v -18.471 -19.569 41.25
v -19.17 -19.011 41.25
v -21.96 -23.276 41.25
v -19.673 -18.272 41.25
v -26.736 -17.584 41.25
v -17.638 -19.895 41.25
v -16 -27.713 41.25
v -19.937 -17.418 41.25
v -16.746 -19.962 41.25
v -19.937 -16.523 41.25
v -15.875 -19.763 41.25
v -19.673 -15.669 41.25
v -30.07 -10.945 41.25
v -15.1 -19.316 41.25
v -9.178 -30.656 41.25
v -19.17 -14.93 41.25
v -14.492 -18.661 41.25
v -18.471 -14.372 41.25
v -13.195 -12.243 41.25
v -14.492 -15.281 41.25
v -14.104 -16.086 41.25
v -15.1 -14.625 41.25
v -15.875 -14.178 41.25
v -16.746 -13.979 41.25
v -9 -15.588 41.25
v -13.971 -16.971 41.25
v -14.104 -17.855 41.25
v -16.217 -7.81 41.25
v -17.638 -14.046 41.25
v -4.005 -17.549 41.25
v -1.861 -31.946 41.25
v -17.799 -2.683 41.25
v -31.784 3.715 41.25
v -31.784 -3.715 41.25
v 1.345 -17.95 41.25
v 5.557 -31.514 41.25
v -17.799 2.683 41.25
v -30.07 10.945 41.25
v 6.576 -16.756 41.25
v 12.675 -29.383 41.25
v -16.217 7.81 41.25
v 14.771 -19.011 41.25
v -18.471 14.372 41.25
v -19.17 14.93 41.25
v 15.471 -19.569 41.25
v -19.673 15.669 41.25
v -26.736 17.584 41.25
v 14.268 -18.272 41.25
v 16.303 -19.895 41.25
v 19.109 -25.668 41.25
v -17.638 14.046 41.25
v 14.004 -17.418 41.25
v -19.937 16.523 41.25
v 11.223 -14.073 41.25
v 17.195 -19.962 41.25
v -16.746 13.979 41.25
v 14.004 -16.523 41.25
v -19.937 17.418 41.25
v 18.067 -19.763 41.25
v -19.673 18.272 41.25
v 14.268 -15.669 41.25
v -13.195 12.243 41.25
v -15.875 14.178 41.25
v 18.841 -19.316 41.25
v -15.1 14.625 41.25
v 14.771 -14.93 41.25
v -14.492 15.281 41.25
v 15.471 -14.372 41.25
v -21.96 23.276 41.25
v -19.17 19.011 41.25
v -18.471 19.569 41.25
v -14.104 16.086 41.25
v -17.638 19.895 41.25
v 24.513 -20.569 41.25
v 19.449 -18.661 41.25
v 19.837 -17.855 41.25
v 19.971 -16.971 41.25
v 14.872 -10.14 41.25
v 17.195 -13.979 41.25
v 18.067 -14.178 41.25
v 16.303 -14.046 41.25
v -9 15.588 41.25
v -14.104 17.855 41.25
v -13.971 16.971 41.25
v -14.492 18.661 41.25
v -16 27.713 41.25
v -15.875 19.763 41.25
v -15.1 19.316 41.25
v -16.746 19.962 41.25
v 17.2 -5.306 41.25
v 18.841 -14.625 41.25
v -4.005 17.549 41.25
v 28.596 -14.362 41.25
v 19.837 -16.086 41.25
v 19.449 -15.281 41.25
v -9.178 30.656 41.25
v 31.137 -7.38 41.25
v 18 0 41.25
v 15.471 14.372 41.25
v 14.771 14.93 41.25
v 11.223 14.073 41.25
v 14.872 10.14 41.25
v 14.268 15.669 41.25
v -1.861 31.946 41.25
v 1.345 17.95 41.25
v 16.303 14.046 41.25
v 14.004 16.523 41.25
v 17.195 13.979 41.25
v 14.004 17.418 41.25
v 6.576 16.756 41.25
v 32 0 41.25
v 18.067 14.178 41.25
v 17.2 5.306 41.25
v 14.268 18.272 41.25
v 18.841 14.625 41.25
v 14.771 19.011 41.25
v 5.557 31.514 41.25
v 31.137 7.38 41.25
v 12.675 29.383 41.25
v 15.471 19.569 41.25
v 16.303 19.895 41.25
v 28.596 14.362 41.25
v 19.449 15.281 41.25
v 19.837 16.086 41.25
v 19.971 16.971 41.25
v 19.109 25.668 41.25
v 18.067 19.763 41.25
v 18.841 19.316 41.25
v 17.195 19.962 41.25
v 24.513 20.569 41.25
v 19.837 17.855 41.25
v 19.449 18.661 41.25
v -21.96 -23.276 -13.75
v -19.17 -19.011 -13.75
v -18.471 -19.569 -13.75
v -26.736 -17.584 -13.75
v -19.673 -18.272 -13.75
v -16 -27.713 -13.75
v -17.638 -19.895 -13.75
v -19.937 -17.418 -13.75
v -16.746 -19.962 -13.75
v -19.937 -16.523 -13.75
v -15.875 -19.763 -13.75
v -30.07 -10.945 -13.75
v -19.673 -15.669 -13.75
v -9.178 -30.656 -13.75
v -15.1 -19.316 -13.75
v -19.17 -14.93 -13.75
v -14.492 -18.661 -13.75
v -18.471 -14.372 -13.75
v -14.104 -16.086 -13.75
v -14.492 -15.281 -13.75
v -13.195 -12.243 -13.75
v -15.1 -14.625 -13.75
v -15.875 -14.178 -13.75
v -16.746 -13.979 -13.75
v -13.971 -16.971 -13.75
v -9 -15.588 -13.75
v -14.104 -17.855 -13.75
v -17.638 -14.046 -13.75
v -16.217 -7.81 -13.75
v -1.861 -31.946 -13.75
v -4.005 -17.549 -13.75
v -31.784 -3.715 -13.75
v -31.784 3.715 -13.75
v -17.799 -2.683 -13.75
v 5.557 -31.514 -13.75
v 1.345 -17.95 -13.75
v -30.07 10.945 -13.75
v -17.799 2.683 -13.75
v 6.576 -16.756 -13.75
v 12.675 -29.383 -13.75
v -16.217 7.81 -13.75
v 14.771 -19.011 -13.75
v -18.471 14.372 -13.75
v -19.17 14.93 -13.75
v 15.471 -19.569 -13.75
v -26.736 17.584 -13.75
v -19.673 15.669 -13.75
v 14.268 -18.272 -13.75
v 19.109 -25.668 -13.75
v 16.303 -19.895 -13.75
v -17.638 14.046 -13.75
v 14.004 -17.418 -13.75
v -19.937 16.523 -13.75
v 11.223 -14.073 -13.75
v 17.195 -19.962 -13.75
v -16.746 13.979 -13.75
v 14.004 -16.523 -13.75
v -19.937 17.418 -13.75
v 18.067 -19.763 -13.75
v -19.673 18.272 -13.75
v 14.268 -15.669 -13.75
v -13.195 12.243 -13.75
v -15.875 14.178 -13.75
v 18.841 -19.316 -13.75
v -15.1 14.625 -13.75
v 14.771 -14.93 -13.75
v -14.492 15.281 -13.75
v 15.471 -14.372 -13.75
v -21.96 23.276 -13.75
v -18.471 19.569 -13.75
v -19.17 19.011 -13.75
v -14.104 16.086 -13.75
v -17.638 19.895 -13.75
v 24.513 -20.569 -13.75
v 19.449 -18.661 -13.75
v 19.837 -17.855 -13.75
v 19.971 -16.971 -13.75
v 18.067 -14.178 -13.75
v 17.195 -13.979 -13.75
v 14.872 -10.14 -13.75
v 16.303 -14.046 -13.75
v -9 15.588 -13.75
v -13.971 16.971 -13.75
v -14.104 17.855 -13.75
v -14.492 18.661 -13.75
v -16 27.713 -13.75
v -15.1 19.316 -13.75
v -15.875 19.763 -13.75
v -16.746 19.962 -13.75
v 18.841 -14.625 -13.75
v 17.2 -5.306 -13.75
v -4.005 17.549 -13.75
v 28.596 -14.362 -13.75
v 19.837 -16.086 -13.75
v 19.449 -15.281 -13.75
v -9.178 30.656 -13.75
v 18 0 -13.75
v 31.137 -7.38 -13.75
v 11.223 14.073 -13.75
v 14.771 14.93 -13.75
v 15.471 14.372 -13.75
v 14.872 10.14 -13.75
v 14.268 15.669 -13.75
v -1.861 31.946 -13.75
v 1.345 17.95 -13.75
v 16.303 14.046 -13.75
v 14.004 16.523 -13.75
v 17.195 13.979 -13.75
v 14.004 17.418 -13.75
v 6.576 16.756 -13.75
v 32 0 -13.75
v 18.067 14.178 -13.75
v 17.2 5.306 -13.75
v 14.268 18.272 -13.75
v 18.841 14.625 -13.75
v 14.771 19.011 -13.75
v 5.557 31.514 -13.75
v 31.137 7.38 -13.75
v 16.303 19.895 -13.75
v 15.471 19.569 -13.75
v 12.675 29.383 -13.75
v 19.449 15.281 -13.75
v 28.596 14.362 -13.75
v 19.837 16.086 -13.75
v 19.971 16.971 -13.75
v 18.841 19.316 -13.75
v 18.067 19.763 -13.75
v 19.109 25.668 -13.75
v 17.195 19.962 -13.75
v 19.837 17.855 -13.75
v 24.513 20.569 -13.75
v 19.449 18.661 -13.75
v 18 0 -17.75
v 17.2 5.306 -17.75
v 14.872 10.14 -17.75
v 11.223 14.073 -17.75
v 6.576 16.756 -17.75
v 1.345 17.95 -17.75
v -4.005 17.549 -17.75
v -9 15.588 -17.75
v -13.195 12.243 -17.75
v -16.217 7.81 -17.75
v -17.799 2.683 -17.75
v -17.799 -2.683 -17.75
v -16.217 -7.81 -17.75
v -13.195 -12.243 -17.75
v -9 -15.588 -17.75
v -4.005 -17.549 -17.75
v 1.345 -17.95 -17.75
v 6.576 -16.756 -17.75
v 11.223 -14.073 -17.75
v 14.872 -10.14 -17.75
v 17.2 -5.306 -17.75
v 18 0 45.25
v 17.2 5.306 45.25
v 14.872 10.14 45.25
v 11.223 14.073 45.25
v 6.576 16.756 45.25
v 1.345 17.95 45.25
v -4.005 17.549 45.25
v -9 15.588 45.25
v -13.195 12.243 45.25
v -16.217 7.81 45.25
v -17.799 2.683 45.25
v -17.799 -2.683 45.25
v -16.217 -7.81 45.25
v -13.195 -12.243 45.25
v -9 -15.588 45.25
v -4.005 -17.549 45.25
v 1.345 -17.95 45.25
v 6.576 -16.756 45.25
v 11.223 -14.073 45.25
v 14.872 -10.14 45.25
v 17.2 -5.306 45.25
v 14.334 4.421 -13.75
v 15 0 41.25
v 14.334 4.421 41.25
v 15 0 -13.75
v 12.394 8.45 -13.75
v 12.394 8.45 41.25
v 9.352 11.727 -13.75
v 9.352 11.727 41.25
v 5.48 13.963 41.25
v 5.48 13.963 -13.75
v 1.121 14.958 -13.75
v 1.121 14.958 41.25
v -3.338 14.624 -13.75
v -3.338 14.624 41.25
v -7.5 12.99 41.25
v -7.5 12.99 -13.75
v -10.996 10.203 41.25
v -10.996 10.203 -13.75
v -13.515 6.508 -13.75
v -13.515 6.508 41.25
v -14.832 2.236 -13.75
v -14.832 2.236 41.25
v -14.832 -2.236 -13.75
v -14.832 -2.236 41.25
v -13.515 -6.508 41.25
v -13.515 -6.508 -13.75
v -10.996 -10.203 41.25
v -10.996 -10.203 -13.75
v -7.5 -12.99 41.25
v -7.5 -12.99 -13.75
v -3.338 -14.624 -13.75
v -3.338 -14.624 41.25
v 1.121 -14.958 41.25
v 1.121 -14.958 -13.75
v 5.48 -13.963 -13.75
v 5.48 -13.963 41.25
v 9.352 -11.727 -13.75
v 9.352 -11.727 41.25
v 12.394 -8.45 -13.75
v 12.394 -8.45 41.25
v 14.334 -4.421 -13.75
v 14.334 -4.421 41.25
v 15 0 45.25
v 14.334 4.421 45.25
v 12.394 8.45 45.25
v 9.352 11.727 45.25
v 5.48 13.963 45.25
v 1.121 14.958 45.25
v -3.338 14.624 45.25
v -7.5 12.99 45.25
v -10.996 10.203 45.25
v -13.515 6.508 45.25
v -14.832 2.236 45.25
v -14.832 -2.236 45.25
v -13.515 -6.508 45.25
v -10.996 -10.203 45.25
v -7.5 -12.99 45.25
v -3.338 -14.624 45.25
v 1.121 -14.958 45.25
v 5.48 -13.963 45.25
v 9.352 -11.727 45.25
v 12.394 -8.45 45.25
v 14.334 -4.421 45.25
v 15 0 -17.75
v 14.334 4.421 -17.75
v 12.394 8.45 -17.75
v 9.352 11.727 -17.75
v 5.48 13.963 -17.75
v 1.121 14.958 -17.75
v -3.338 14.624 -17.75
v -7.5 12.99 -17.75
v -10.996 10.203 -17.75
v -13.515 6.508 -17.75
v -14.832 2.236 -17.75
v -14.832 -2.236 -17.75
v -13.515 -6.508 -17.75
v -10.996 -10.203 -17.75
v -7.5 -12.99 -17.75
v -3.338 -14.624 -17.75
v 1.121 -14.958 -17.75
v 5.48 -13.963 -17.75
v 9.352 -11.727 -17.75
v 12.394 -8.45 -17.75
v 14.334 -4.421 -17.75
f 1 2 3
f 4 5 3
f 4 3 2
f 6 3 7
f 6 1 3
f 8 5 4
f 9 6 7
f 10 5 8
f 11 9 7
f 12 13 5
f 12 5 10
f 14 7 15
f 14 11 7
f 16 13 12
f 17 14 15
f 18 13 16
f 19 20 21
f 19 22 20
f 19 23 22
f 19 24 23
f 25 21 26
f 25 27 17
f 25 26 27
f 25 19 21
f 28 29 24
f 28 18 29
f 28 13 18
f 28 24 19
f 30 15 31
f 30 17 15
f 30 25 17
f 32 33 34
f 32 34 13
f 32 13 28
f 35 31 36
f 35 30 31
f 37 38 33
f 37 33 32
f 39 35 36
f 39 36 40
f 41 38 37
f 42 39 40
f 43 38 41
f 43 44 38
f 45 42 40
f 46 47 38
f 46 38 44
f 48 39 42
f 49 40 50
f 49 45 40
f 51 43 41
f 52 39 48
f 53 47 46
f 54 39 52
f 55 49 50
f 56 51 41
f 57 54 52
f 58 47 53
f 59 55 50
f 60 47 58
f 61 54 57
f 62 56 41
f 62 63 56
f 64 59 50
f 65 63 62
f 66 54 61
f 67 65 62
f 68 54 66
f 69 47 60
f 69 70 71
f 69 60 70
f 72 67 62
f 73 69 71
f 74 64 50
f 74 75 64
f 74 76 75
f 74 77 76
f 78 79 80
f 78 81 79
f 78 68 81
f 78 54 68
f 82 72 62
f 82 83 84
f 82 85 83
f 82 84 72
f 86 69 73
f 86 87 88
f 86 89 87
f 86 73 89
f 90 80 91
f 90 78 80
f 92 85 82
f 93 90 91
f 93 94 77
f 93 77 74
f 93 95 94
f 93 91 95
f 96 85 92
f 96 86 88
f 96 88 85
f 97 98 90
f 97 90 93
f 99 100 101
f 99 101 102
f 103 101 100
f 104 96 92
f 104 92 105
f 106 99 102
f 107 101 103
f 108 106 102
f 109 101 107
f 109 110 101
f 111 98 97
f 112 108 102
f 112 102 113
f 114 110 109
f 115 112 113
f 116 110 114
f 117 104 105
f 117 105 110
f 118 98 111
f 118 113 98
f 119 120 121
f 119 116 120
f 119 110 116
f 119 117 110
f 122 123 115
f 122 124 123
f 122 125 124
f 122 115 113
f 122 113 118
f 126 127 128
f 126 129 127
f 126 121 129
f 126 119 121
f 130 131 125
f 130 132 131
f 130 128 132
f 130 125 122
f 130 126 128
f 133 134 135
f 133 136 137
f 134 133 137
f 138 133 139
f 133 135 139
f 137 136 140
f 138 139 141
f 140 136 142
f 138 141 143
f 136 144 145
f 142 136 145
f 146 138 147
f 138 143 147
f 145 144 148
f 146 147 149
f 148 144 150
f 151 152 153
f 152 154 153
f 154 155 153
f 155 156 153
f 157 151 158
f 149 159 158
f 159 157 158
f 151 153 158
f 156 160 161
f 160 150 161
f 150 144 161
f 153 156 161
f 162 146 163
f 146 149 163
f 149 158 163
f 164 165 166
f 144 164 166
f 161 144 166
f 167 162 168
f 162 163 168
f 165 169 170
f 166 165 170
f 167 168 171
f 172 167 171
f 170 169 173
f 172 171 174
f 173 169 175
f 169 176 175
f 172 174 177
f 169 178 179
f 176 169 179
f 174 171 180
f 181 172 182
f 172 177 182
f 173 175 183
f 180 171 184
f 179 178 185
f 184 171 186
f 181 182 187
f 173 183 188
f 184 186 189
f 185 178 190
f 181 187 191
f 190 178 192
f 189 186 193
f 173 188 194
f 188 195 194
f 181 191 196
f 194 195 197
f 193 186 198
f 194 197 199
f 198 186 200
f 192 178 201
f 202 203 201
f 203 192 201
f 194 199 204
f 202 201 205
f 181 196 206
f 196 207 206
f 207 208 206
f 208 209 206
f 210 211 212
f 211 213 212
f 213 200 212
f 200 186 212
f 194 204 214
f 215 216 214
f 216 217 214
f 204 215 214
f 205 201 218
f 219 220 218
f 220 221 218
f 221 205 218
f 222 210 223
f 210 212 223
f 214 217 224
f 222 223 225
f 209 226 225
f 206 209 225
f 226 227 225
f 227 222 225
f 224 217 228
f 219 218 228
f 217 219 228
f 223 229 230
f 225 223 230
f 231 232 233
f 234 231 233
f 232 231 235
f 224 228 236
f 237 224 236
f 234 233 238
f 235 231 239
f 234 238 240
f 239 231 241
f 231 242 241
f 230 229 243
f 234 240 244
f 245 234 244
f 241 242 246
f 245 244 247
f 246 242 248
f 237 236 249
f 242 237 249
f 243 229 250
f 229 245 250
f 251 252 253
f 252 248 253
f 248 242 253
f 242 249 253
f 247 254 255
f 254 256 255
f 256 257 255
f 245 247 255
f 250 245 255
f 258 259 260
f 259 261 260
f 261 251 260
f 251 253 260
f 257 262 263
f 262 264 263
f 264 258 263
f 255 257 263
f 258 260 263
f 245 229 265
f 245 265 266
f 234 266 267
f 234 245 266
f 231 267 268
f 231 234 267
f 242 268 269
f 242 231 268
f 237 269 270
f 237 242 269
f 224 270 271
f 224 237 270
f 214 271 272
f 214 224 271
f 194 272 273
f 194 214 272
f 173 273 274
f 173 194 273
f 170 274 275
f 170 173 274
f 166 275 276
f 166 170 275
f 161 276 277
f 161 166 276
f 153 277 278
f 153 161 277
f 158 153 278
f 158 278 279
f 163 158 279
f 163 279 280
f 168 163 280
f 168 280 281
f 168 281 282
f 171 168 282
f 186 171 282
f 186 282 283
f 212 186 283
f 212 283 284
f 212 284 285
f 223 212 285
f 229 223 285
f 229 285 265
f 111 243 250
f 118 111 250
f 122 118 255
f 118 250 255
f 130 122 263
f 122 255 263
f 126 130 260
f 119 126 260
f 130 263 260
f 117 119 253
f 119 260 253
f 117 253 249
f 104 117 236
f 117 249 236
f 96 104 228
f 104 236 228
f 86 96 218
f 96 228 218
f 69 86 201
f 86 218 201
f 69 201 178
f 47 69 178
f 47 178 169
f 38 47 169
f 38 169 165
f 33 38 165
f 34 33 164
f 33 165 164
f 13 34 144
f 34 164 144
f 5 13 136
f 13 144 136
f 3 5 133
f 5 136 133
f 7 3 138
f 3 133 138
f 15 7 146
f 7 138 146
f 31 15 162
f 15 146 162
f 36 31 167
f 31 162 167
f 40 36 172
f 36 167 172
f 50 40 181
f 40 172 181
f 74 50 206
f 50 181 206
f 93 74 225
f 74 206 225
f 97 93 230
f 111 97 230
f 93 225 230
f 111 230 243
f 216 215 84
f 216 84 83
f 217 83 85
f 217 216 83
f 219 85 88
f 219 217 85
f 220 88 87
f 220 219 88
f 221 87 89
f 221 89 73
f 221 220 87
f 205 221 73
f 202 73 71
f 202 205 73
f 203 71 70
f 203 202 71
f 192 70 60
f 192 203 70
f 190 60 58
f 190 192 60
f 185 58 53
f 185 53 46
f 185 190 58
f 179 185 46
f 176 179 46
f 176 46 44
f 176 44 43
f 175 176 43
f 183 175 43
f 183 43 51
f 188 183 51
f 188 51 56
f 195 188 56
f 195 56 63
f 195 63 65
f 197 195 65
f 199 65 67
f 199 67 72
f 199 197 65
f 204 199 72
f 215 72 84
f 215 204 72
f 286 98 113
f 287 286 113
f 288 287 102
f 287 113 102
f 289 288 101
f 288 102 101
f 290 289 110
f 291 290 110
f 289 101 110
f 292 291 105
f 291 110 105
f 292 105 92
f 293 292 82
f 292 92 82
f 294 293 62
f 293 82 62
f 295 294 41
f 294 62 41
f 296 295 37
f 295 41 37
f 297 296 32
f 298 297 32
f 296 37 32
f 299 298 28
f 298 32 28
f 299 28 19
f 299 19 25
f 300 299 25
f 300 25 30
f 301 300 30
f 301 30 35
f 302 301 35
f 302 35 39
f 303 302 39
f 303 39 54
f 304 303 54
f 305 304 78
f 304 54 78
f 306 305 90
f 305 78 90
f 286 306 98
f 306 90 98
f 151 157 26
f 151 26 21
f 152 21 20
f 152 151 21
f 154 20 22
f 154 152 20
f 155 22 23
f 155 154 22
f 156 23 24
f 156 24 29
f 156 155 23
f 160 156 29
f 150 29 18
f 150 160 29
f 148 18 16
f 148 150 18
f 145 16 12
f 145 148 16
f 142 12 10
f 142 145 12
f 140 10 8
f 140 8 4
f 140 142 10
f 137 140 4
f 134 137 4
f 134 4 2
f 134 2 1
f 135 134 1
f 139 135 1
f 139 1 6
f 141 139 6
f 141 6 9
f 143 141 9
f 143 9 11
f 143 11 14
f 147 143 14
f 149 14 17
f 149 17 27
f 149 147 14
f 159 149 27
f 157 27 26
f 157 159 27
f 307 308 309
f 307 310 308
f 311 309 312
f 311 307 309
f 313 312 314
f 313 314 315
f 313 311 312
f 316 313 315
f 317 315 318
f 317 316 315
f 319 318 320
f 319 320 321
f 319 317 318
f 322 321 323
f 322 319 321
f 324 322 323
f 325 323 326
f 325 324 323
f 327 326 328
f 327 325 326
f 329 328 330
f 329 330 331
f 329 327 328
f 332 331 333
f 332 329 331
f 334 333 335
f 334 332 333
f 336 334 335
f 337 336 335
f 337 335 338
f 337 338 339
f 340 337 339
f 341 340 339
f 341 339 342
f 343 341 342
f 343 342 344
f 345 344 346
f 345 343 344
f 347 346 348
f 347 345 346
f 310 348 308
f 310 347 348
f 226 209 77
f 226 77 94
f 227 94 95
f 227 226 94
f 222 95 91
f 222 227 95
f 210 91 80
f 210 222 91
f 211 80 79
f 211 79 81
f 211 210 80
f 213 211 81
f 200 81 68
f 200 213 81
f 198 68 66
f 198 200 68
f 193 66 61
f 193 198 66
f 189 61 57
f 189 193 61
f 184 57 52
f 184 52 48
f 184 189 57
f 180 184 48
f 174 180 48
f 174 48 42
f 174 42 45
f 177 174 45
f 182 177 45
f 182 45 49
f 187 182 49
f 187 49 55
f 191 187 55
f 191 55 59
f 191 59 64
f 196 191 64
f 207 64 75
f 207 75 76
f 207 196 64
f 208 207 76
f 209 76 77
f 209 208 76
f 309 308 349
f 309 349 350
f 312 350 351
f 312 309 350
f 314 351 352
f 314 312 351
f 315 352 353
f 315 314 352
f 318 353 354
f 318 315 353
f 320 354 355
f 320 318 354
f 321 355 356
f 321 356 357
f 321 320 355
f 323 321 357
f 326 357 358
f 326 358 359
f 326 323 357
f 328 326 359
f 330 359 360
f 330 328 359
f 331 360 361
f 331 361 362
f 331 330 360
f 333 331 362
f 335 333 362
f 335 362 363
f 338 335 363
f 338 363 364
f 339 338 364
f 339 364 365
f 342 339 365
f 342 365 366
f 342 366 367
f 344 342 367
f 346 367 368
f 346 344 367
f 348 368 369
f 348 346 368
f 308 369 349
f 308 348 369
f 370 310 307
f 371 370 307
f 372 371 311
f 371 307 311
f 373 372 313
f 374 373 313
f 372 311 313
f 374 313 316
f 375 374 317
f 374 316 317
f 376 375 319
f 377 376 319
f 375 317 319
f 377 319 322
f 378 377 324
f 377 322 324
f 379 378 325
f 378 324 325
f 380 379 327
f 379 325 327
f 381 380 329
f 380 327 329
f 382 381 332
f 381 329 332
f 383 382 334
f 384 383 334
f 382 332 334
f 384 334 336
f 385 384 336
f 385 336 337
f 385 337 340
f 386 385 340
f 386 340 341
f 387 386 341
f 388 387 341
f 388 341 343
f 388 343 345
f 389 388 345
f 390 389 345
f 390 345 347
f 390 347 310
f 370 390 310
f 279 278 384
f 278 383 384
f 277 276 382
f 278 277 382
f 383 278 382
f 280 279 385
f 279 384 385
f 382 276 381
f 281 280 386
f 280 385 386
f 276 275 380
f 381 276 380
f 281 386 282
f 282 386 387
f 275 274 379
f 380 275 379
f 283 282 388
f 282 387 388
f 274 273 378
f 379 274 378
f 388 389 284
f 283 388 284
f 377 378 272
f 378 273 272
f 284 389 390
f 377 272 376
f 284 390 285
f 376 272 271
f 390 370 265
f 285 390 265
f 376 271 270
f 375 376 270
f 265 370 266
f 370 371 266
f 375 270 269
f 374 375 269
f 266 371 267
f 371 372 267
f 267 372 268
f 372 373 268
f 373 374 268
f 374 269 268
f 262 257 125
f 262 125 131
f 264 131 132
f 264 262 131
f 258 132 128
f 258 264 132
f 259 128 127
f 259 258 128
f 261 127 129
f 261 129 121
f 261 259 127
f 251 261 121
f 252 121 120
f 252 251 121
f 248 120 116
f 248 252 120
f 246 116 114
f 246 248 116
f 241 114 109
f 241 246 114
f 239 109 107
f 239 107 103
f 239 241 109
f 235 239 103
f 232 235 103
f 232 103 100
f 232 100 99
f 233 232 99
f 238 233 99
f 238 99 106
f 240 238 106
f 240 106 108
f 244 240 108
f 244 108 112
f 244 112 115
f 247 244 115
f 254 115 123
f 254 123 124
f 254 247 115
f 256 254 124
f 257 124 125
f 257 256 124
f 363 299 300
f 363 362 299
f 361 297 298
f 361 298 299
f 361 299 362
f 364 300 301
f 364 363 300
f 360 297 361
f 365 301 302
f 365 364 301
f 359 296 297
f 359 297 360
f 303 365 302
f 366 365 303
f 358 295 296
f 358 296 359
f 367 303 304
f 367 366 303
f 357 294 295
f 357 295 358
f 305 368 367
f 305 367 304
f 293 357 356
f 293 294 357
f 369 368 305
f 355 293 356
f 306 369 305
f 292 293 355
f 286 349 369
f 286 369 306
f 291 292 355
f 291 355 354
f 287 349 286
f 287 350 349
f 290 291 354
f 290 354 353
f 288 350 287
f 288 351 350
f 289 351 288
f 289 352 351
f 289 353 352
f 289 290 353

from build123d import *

# Parameters (mm, degrees)
SKETCH1_R                = 16
SKETCH1_R_2              = 7.5
SKETCH1_R_3              = 1.5
BOSS_EXTRUDE1_DEPTH      = 27.5
SKETCH2_R                = 9
SKETCH2_R_2              = 7.5
BOSS_EXTRUDE2_DEPTH      = 2
BOSS_EXTRUDE2_DEPTH_BACK = 29.5
SCALE1_SCALE             = 2


with BuildPart() as part:
    # Sketch1 → Boss-Extrude1 (new body)
    with BuildSketch(Plane.XY):
        Circle(SKETCH1_R)
        Circle(SKETCH1_R_2, mode=Mode.SUBTRACT)
        with Locations((-8.485281374, 8.485281374)):
            Circle(SKETCH1_R_3, mode=Mode.SUBTRACT)
        with Locations((8.485281374, 8.485281374)):
            Circle(SKETCH1_R_3, mode=Mode.SUBTRACT)
        with Locations((8.485281374, -8.485281374)):
            Circle(SKETCH1_R_3, mode=Mode.SUBTRACT)
        with Locations((-8.485281374, -8.485281374)):
            Circle(SKETCH1_R_3, mode=Mode.SUBTRACT)
    extrude(amount=BOSS_EXTRUDE1_DEPTH)

    # Sketch2 → Boss-Extrude2 (add, two sides)
    with BuildSketch(Plane.XY.offset(27.5)) as boss_extrude2_sk:
        Circle(SKETCH2_R)
        Circle(SKETCH2_R_2, mode=Mode.SUBTRACT)
    extrude(amount=BOSS_EXTRUDE2_DEPTH)
    extrude(boss_extrude2_sk.sketch, amount=-BOSS_EXTRUDE2_DEPTH_BACK)


with BuildPart() as part_1:
    # Scale1: scaled about (0, 0, 13.75)
    add(part.part.scale(SCALE1_SCALE).moved(Location((0, 0, -13.75))))


solid = part_1.part
